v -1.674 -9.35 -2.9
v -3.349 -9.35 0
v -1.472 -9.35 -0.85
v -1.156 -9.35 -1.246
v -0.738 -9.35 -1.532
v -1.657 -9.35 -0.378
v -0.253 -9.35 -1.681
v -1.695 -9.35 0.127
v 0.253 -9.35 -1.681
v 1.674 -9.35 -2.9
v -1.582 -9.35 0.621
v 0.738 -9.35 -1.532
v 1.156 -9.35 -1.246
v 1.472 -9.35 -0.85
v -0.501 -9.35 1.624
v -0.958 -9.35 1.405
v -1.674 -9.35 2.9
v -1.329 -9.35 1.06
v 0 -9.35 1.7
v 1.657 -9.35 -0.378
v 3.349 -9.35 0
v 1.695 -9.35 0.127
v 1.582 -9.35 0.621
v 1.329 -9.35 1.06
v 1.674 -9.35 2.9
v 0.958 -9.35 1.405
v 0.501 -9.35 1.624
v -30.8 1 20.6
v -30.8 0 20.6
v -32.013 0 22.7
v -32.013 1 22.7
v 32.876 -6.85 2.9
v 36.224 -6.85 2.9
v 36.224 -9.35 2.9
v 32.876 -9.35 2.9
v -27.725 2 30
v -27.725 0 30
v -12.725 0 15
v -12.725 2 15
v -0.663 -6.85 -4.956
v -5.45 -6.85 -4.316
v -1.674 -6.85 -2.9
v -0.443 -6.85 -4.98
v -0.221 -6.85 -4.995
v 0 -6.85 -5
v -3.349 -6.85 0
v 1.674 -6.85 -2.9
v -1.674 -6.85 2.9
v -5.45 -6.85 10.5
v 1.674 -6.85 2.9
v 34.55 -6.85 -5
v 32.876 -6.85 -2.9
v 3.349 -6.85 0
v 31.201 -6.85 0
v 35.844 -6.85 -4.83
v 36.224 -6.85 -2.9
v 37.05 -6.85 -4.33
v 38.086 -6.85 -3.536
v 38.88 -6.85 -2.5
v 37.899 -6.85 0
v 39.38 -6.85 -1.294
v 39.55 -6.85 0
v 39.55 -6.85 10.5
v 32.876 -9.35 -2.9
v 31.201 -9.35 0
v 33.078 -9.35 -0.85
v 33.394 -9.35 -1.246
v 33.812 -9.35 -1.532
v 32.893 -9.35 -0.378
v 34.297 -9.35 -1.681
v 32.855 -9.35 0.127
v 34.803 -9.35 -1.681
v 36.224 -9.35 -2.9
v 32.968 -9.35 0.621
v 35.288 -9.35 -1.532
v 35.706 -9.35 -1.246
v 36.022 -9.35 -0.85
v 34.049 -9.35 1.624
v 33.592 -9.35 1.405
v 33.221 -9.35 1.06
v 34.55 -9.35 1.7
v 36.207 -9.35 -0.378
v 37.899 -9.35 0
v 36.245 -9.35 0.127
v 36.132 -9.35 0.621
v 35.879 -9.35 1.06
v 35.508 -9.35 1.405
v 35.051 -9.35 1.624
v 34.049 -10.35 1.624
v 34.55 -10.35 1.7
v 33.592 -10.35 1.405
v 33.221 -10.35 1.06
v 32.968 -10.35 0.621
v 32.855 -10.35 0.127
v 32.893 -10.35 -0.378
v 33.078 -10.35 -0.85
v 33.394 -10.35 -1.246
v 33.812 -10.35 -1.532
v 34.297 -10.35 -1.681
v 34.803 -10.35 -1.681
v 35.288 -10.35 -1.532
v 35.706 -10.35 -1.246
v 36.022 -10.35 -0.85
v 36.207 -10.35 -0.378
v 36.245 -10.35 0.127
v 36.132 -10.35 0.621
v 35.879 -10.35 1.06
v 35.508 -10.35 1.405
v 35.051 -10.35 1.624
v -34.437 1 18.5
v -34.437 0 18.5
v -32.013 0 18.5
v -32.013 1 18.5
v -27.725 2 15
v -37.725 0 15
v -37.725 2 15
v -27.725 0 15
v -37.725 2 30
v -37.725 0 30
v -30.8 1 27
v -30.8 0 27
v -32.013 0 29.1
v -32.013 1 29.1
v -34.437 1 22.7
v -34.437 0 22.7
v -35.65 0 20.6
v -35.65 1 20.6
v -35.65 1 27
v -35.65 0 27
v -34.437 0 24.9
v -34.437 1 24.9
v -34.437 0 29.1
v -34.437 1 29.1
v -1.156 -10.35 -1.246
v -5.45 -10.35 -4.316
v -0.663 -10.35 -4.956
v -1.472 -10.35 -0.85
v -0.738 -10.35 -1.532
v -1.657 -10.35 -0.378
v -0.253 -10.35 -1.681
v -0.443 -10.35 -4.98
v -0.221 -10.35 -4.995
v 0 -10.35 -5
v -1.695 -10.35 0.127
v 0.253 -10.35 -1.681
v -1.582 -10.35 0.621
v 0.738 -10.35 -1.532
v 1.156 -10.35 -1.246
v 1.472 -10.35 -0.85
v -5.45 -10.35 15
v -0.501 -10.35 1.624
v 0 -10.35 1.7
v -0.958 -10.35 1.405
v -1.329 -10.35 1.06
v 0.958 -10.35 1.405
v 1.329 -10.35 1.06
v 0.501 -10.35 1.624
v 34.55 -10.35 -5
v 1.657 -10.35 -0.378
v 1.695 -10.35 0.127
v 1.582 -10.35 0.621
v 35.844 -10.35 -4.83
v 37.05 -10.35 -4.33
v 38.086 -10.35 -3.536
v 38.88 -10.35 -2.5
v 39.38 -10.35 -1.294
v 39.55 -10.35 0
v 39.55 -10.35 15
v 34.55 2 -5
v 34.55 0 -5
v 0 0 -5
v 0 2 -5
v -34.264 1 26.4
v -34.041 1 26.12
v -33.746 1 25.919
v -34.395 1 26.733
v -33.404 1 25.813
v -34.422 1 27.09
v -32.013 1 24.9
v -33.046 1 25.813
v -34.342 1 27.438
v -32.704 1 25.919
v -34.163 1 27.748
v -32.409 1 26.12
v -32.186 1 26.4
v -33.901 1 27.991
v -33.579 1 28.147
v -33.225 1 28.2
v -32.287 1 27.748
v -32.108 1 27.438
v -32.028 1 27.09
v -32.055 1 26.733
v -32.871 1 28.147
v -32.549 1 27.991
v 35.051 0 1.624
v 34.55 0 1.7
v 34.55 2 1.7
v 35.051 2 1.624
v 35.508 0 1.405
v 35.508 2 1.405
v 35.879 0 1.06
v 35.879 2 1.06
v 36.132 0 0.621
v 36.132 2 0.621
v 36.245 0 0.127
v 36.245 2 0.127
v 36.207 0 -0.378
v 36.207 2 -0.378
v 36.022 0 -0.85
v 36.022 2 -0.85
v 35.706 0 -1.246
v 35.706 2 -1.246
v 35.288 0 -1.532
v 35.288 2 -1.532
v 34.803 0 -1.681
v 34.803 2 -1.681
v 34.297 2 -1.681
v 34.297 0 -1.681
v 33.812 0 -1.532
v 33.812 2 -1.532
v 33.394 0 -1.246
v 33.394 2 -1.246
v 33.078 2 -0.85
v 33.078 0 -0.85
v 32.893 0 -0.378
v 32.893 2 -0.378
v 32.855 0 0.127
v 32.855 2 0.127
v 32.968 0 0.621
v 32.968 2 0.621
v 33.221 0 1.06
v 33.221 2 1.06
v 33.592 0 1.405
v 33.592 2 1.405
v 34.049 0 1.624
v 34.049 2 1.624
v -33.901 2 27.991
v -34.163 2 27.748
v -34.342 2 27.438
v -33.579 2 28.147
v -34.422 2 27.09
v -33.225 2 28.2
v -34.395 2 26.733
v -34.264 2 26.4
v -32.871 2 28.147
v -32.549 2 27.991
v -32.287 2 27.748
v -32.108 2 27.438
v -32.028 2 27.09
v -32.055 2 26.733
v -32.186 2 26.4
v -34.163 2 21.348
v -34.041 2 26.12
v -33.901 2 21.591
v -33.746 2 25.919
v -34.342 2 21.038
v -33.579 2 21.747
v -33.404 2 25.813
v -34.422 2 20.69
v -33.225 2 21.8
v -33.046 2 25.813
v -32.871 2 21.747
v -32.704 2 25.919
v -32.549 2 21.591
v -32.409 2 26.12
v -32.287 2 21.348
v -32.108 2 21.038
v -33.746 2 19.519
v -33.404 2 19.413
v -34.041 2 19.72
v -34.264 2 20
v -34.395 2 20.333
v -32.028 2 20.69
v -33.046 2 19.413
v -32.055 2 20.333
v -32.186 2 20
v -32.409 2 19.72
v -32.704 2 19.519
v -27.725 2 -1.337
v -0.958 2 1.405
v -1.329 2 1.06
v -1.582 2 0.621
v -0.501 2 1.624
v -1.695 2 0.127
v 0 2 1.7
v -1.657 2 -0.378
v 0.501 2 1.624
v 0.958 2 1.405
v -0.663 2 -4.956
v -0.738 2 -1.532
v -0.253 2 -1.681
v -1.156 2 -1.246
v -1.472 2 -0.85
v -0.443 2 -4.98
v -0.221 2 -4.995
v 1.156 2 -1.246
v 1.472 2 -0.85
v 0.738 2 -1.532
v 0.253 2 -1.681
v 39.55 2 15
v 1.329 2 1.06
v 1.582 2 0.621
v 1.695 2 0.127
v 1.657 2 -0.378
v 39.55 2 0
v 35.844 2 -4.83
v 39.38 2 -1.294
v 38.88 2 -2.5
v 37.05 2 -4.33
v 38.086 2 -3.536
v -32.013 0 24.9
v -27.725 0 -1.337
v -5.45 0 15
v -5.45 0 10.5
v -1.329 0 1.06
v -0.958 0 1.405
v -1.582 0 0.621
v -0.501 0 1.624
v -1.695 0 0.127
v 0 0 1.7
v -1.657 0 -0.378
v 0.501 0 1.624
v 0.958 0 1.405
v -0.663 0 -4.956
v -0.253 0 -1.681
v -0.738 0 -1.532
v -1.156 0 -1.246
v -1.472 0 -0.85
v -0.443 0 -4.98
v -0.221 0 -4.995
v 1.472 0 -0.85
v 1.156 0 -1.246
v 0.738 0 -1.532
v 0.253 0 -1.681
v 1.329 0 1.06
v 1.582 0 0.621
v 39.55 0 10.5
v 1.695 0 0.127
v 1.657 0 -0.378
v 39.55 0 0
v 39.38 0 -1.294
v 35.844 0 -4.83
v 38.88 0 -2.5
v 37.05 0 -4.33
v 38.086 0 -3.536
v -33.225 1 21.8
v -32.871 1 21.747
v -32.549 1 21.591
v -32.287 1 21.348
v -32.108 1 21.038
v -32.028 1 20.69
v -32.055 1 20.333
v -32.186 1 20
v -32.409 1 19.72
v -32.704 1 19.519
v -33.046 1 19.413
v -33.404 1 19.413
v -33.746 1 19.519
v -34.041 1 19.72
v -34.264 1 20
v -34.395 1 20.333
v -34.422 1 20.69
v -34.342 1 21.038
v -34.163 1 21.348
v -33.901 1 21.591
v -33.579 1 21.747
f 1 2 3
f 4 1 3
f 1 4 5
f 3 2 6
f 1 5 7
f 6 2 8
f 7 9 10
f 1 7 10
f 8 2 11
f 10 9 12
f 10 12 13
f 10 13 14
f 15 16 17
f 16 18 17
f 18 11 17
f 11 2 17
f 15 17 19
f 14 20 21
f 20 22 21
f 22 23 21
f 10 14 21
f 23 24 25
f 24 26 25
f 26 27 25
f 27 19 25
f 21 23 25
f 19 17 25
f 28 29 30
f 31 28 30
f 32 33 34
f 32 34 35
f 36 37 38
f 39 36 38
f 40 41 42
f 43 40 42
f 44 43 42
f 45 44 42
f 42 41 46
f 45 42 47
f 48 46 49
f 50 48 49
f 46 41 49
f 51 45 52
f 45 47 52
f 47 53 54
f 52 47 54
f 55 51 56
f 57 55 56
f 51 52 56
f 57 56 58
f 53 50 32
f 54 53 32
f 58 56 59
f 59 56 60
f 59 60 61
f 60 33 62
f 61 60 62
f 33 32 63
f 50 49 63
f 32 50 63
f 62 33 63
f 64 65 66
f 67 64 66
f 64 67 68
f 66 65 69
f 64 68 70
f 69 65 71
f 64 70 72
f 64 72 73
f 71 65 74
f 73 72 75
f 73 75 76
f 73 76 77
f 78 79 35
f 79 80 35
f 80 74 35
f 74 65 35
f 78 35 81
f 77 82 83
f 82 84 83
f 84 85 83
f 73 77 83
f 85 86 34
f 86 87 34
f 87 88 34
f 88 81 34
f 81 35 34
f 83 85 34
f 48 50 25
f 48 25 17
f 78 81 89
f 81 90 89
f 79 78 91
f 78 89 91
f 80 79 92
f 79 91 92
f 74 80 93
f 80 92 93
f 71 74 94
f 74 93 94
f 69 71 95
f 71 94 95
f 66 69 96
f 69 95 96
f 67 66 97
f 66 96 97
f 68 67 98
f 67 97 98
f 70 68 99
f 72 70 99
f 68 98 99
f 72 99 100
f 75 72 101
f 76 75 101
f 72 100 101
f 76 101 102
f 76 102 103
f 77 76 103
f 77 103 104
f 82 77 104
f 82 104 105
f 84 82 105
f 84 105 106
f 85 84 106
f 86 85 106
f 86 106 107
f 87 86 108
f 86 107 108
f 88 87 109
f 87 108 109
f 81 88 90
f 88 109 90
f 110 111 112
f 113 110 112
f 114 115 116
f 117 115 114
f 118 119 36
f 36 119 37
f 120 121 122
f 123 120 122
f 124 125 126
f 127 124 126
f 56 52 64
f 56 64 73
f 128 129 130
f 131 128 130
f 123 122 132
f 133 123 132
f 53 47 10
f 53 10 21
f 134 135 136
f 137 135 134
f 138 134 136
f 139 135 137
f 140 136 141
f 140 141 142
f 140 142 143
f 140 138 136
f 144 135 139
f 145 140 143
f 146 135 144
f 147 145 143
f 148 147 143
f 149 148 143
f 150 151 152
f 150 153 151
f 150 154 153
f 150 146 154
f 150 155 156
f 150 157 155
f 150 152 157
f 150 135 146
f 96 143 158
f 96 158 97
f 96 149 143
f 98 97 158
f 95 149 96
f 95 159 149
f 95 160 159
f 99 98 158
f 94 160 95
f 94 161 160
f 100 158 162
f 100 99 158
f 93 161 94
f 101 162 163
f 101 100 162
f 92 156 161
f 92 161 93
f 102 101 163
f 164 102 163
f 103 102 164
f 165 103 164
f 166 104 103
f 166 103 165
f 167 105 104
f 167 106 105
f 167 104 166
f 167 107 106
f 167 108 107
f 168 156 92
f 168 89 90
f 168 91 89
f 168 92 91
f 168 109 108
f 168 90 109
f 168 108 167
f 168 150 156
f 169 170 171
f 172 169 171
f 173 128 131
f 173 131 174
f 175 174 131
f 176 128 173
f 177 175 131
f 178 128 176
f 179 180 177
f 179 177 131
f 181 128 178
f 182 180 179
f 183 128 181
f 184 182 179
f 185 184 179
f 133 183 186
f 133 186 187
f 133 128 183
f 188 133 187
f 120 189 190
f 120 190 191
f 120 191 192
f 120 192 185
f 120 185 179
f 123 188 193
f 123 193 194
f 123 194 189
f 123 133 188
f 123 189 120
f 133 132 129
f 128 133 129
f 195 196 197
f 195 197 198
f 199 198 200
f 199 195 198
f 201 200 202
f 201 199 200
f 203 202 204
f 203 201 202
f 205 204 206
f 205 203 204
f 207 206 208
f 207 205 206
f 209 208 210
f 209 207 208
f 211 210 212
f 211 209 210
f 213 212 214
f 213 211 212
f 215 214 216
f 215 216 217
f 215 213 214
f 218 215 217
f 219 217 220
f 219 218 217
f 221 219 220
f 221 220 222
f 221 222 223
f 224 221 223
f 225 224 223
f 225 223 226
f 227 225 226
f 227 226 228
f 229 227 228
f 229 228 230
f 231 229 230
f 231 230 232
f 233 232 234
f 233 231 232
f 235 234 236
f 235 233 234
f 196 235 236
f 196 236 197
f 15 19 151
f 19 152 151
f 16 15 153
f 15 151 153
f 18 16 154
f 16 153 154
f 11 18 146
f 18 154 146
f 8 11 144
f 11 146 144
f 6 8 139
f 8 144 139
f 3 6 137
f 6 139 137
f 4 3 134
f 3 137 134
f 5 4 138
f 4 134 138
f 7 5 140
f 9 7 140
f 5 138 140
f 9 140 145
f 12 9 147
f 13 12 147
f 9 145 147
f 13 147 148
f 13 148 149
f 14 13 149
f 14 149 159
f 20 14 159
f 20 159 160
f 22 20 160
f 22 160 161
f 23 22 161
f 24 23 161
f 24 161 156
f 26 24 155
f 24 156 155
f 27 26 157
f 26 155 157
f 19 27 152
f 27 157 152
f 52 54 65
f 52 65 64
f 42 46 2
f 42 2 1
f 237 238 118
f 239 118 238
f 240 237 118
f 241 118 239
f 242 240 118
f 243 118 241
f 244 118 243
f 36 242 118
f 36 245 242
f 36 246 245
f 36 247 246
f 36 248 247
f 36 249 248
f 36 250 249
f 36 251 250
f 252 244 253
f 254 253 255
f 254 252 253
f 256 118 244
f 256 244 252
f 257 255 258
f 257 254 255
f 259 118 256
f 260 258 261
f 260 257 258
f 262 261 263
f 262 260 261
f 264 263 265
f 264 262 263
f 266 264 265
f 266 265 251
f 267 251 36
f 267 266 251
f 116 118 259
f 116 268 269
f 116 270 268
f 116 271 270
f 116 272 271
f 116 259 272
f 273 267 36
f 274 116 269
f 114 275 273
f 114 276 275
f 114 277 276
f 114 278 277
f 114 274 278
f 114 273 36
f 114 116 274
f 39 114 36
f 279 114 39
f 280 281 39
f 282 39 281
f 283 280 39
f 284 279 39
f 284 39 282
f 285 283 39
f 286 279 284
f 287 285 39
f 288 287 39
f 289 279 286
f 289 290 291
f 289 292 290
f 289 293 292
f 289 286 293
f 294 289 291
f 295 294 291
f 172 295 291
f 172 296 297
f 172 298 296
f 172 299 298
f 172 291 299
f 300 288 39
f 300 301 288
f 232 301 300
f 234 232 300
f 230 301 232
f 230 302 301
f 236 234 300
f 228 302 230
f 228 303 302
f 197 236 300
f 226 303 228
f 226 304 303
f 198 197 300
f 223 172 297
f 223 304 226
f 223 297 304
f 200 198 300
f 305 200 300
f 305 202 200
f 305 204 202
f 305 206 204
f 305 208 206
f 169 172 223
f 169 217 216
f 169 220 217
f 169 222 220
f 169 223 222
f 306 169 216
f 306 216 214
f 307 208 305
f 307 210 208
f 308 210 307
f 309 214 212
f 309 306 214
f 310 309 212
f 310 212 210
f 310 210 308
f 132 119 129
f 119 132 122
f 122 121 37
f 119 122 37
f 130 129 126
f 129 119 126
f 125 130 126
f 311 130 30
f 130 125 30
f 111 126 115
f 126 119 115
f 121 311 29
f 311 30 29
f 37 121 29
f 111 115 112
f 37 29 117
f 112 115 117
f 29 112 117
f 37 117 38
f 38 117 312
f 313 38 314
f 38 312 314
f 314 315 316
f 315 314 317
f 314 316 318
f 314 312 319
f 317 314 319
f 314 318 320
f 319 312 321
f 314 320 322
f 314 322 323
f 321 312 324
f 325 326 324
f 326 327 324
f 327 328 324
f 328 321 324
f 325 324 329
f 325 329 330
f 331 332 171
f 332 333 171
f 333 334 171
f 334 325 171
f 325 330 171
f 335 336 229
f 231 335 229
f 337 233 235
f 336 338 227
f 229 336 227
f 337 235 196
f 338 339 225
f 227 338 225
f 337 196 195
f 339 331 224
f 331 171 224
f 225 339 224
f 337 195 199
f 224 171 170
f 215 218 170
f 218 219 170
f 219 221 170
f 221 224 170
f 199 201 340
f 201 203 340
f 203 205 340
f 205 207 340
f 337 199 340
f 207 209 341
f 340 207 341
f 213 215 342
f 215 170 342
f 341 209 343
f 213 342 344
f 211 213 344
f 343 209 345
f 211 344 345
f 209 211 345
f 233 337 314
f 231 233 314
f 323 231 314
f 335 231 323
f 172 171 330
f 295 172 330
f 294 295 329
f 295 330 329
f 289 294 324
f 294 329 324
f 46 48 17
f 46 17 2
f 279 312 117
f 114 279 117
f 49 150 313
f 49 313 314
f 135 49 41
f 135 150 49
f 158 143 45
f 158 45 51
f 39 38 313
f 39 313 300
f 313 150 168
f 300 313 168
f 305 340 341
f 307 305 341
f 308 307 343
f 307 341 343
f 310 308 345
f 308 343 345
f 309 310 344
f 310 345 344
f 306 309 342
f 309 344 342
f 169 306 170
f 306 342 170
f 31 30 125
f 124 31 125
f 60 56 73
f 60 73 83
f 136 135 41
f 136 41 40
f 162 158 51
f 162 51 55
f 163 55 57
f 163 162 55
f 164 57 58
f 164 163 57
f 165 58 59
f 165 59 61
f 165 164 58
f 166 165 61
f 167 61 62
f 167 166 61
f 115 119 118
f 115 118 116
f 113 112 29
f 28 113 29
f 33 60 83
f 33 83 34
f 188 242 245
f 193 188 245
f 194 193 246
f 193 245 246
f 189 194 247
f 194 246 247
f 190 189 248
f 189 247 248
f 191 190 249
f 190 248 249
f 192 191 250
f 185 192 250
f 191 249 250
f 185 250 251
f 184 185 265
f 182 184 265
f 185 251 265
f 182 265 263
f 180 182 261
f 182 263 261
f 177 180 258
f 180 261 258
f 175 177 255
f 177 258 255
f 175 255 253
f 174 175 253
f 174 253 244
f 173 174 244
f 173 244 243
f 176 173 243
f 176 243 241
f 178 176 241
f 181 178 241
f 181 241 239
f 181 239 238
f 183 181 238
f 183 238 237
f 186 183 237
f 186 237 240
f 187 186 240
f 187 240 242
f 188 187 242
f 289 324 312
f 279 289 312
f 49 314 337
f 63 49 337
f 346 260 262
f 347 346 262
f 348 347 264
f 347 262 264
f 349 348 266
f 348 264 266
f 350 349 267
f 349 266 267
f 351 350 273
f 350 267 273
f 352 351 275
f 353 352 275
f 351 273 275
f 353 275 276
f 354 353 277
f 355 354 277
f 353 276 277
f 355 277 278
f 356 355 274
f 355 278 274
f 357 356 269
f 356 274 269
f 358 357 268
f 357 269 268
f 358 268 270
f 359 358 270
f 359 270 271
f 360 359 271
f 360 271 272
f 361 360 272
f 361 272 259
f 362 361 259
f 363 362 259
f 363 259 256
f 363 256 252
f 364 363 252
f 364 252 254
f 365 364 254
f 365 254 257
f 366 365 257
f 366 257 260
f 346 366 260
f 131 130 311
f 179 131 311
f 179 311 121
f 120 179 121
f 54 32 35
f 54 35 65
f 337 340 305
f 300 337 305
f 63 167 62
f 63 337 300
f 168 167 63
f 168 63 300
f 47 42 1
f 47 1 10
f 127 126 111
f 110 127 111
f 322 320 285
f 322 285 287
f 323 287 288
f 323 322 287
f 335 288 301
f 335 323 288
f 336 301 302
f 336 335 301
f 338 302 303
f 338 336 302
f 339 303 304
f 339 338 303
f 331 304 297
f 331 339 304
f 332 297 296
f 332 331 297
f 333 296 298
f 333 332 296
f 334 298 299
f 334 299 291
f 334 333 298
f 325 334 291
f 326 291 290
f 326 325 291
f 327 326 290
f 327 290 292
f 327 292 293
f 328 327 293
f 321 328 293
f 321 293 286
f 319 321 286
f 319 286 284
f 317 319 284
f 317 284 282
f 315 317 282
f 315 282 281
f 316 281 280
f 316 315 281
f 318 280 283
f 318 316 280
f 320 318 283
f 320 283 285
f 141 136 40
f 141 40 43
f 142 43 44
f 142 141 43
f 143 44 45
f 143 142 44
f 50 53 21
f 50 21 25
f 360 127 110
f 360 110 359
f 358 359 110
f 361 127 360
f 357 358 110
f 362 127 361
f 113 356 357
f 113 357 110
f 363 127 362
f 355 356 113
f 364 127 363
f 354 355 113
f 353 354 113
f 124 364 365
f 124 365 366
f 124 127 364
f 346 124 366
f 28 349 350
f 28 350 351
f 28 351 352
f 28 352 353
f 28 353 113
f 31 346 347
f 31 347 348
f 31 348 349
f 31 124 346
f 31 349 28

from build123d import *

# Parameters (mm, degrees)
SKETCH1_R           = 1.7
BOSS_EXTRUDE1_DEPTH = 2
SKETCH2_W           = 45
SKETCH2_H           = 4.5
BOSS_EXTRUDE2_DEPTH = 6.85
BOSS_EXTRUDE3_START = 3.5
BOSS_EXTRUDE3_DEPTH = 3.5
CUT_EXTRUDE1_DEPTH  = 2.5
CUT_EXTRUDE2_REACH  = 53.154
SKETCH4_R           = 1.2
CUT_EXTRUDE3_DEPTH  = 1
CUT_EXTRUDE4_REACH  = 53.154
SKETCH6_R           = 1.7


with BuildPart() as part:
    # Sketch1 → Boss-Extrude1 (new body)
    with BuildSketch(Plane(origin=(0, 0, 0), x_dir=(1, 0, 0), z_dir=(0, 1, 0))):
        with BuildLine():
            Line((34.55, 5), (0, 5))
            ThreePointArc((0, 5), (-0.332078478, 4.988960201), (-0.662690524, 4.955889554))
            Line((-0.662690524, 4.955889554), (-27.725, 1.337177748))
            Line((-27.725, 1.337177748), (-27.725, -15))
            Line((-27.725, -15), (-37.725, -15))
            Line((-37.725, -15), (-37.725, -30))
            Line((-37.725, -30), (-27.725, -30))
            Line((-27.725, -30), (-12.725, -15))
            Line((-12.725, -15), (39.55, -15))
            Line((39.55, -15), (39.55, 0))
            ThreePointArc((39.55, 0), (38.085533906, 3.535533906), (34.55, 5))
        make_face()
        Circle(SKETCH1_R, mode=Mode.SUBTRACT)
        with Locations((34.55, 0)):
            Circle(SKETCH1_R, mode=Mode.SUBTRACT)
    extrude(amount=BOSS_EXTRUDE1_DEPTH)

    # Sketch2 → Boss-Extrude2 (add)
    with BuildSketch(Plane.XZ):
        with Locations((17.05, 12.75)):
            Rectangle(SKETCH2_W, SKETCH2_H)
    extrude(amount=BOSS_EXTRUDE2_DEPTH)

    # Sketch3 → Boss-Extrude3 (add)
    with BuildSketch(Plane.XZ.offset(6.85).offset(BOSS_EXTRUDE3_START)):
        with BuildLine():
            Line((39.55, 0), (39.55, 15))
            Line((39.55, 15), (-5.45, 15))
            Line((-5.45, 15), (-5.45, -4.315741183))
            Line((-5.45, -4.315741183), (-0.662690524, -4.955889554))
            ThreePointArc((-0.662690524, -4.955889554), (-0.332078478, -4.988960201), (0, -5))
            Line((0, -5), (34.55, -5))
            ThreePointArc((34.55, -5), (38.085533906, -3.535533906), (39.55, 0))
        make_face()
    extrude(amount=-BOSS_EXTRUDE3_DEPTH)

    # Sketch3<3> → Cut-Extrude1 (cut)
    with BuildSketch(Plane.XZ.offset(6.85)):
        Polygon((37.898631561, 0), (36.224315781, 2.9), (32.875684219, 2.9), (31.201368439, 0), (32.875684219, -2.9), (36.224315781, -2.9), align=None)
        Polygon((3.348631561, 0), (1.674315781, 2.9), (-1.674315781, 2.9), (-3.348631561, 0), (-1.674315781, -2.9), (1.674315781, -2.9), align=None)
    extrude(amount=CUT_EXTRUDE1_DEPTH, mode=Mode.SUBTRACT)

    # Sketch4 → Cut-Extrude2 (cut, up to next)
    with BuildSketch(Plane(origin=(0, 2, 0), x_dir=(1, 0, 0), z_dir=(0, 1, 0)), mode=Mode.PRIVATE) as cut_extrude2_sk1:
        with Locations((-33.225, -20.6)):
            Circle(SKETCH4_R)
    cut_extrude2_tool1 = extrude(cut_extrude2_sk1.sketch, amount=-CUT_EXTRUDE2_REACH, mode=Mode.PRIVATE) & part.part
    # Sketch4 → Cut-Extrude2 (cut, up to next)
    with BuildSketch(Plane(origin=(0, 2, 0), x_dir=(1, 0, 0), z_dir=(0, 1, 0)), mode=Mode.PRIVATE) as cut_extrude2_sk2:
        with Locations((-33.225, -27)):
            Circle(SKETCH4_R)
    cut_extrude2_tool2 = extrude(cut_extrude2_sk2.sketch, amount=-CUT_EXTRUDE2_REACH, mode=Mode.PRIVATE) & part.part
    add(cut_extrude2_tool1.solids().sort_by_distance((-33.225, 2, 20.6))[0], mode=Mode.SUBTRACT)
    add(cut_extrude2_tool2.solids().sort_by_distance((-33.225, 2, 27))[0], mode=Mode.SUBTRACT)

    # Sketch5 → Cut-Extrude3 (cut)
    with BuildSketch(Plane.XZ):
        Polygon((-32.012564435, 22.7), (-34.437435565, 22.7), (-35.649871131, 20.6), (-34.437435565, 18.5), (-32.012564435, 18.5), (-30.800128869, 20.6), align=None)
        Polygon((-32.012564435, 29.1), (-34.437435565, 29.1), (-35.649871131, 27), (-34.437435565, 24.9), (-32.012564435, 24.9), (-30.800128869, 27), align=None)
    extrude(amount=-CUT_EXTRUDE3_DEPTH, mode=Mode.SUBTRACT)

    # Sketch6 → Cut-Extrude4 (cut, up to next)
    with BuildSketch(Plane.XZ.offset(10.35), mode=Mode.PRIVATE) as cut_extrude4_sk1:
        Circle(SKETCH6_R)
    cut_extrude4_tool1 = extrude(cut_extrude4_sk1.sketch, amount=-CUT_EXTRUDE4_REACH, mode=Mode.PRIVATE) & part.part
    # Sketch6 → Cut-Extrude4 (cut, up to next)
    with BuildSketch(Plane.XZ.offset(10.35), mode=Mode.PRIVATE) as cut_extrude4_sk2:
        with Locations((34.55, 0)):
            Circle(SKETCH6_R)
    cut_extrude4_tool2 = extrude(cut_extrude4_sk2.sketch, amount=-CUT_EXTRUDE4_REACH, mode=Mode.PRIVATE) & part.part
    add(cut_extrude4_tool1.solids().sort_by_distance((0, -10.35, 0))[0], mode=Mode.SUBTRACT)
    add(cut_extrude4_tool2.solids().sort_by_distance((34.55, -10.35, 0))[0], mode=Mode.SUBTRACT)


solid = part.part
